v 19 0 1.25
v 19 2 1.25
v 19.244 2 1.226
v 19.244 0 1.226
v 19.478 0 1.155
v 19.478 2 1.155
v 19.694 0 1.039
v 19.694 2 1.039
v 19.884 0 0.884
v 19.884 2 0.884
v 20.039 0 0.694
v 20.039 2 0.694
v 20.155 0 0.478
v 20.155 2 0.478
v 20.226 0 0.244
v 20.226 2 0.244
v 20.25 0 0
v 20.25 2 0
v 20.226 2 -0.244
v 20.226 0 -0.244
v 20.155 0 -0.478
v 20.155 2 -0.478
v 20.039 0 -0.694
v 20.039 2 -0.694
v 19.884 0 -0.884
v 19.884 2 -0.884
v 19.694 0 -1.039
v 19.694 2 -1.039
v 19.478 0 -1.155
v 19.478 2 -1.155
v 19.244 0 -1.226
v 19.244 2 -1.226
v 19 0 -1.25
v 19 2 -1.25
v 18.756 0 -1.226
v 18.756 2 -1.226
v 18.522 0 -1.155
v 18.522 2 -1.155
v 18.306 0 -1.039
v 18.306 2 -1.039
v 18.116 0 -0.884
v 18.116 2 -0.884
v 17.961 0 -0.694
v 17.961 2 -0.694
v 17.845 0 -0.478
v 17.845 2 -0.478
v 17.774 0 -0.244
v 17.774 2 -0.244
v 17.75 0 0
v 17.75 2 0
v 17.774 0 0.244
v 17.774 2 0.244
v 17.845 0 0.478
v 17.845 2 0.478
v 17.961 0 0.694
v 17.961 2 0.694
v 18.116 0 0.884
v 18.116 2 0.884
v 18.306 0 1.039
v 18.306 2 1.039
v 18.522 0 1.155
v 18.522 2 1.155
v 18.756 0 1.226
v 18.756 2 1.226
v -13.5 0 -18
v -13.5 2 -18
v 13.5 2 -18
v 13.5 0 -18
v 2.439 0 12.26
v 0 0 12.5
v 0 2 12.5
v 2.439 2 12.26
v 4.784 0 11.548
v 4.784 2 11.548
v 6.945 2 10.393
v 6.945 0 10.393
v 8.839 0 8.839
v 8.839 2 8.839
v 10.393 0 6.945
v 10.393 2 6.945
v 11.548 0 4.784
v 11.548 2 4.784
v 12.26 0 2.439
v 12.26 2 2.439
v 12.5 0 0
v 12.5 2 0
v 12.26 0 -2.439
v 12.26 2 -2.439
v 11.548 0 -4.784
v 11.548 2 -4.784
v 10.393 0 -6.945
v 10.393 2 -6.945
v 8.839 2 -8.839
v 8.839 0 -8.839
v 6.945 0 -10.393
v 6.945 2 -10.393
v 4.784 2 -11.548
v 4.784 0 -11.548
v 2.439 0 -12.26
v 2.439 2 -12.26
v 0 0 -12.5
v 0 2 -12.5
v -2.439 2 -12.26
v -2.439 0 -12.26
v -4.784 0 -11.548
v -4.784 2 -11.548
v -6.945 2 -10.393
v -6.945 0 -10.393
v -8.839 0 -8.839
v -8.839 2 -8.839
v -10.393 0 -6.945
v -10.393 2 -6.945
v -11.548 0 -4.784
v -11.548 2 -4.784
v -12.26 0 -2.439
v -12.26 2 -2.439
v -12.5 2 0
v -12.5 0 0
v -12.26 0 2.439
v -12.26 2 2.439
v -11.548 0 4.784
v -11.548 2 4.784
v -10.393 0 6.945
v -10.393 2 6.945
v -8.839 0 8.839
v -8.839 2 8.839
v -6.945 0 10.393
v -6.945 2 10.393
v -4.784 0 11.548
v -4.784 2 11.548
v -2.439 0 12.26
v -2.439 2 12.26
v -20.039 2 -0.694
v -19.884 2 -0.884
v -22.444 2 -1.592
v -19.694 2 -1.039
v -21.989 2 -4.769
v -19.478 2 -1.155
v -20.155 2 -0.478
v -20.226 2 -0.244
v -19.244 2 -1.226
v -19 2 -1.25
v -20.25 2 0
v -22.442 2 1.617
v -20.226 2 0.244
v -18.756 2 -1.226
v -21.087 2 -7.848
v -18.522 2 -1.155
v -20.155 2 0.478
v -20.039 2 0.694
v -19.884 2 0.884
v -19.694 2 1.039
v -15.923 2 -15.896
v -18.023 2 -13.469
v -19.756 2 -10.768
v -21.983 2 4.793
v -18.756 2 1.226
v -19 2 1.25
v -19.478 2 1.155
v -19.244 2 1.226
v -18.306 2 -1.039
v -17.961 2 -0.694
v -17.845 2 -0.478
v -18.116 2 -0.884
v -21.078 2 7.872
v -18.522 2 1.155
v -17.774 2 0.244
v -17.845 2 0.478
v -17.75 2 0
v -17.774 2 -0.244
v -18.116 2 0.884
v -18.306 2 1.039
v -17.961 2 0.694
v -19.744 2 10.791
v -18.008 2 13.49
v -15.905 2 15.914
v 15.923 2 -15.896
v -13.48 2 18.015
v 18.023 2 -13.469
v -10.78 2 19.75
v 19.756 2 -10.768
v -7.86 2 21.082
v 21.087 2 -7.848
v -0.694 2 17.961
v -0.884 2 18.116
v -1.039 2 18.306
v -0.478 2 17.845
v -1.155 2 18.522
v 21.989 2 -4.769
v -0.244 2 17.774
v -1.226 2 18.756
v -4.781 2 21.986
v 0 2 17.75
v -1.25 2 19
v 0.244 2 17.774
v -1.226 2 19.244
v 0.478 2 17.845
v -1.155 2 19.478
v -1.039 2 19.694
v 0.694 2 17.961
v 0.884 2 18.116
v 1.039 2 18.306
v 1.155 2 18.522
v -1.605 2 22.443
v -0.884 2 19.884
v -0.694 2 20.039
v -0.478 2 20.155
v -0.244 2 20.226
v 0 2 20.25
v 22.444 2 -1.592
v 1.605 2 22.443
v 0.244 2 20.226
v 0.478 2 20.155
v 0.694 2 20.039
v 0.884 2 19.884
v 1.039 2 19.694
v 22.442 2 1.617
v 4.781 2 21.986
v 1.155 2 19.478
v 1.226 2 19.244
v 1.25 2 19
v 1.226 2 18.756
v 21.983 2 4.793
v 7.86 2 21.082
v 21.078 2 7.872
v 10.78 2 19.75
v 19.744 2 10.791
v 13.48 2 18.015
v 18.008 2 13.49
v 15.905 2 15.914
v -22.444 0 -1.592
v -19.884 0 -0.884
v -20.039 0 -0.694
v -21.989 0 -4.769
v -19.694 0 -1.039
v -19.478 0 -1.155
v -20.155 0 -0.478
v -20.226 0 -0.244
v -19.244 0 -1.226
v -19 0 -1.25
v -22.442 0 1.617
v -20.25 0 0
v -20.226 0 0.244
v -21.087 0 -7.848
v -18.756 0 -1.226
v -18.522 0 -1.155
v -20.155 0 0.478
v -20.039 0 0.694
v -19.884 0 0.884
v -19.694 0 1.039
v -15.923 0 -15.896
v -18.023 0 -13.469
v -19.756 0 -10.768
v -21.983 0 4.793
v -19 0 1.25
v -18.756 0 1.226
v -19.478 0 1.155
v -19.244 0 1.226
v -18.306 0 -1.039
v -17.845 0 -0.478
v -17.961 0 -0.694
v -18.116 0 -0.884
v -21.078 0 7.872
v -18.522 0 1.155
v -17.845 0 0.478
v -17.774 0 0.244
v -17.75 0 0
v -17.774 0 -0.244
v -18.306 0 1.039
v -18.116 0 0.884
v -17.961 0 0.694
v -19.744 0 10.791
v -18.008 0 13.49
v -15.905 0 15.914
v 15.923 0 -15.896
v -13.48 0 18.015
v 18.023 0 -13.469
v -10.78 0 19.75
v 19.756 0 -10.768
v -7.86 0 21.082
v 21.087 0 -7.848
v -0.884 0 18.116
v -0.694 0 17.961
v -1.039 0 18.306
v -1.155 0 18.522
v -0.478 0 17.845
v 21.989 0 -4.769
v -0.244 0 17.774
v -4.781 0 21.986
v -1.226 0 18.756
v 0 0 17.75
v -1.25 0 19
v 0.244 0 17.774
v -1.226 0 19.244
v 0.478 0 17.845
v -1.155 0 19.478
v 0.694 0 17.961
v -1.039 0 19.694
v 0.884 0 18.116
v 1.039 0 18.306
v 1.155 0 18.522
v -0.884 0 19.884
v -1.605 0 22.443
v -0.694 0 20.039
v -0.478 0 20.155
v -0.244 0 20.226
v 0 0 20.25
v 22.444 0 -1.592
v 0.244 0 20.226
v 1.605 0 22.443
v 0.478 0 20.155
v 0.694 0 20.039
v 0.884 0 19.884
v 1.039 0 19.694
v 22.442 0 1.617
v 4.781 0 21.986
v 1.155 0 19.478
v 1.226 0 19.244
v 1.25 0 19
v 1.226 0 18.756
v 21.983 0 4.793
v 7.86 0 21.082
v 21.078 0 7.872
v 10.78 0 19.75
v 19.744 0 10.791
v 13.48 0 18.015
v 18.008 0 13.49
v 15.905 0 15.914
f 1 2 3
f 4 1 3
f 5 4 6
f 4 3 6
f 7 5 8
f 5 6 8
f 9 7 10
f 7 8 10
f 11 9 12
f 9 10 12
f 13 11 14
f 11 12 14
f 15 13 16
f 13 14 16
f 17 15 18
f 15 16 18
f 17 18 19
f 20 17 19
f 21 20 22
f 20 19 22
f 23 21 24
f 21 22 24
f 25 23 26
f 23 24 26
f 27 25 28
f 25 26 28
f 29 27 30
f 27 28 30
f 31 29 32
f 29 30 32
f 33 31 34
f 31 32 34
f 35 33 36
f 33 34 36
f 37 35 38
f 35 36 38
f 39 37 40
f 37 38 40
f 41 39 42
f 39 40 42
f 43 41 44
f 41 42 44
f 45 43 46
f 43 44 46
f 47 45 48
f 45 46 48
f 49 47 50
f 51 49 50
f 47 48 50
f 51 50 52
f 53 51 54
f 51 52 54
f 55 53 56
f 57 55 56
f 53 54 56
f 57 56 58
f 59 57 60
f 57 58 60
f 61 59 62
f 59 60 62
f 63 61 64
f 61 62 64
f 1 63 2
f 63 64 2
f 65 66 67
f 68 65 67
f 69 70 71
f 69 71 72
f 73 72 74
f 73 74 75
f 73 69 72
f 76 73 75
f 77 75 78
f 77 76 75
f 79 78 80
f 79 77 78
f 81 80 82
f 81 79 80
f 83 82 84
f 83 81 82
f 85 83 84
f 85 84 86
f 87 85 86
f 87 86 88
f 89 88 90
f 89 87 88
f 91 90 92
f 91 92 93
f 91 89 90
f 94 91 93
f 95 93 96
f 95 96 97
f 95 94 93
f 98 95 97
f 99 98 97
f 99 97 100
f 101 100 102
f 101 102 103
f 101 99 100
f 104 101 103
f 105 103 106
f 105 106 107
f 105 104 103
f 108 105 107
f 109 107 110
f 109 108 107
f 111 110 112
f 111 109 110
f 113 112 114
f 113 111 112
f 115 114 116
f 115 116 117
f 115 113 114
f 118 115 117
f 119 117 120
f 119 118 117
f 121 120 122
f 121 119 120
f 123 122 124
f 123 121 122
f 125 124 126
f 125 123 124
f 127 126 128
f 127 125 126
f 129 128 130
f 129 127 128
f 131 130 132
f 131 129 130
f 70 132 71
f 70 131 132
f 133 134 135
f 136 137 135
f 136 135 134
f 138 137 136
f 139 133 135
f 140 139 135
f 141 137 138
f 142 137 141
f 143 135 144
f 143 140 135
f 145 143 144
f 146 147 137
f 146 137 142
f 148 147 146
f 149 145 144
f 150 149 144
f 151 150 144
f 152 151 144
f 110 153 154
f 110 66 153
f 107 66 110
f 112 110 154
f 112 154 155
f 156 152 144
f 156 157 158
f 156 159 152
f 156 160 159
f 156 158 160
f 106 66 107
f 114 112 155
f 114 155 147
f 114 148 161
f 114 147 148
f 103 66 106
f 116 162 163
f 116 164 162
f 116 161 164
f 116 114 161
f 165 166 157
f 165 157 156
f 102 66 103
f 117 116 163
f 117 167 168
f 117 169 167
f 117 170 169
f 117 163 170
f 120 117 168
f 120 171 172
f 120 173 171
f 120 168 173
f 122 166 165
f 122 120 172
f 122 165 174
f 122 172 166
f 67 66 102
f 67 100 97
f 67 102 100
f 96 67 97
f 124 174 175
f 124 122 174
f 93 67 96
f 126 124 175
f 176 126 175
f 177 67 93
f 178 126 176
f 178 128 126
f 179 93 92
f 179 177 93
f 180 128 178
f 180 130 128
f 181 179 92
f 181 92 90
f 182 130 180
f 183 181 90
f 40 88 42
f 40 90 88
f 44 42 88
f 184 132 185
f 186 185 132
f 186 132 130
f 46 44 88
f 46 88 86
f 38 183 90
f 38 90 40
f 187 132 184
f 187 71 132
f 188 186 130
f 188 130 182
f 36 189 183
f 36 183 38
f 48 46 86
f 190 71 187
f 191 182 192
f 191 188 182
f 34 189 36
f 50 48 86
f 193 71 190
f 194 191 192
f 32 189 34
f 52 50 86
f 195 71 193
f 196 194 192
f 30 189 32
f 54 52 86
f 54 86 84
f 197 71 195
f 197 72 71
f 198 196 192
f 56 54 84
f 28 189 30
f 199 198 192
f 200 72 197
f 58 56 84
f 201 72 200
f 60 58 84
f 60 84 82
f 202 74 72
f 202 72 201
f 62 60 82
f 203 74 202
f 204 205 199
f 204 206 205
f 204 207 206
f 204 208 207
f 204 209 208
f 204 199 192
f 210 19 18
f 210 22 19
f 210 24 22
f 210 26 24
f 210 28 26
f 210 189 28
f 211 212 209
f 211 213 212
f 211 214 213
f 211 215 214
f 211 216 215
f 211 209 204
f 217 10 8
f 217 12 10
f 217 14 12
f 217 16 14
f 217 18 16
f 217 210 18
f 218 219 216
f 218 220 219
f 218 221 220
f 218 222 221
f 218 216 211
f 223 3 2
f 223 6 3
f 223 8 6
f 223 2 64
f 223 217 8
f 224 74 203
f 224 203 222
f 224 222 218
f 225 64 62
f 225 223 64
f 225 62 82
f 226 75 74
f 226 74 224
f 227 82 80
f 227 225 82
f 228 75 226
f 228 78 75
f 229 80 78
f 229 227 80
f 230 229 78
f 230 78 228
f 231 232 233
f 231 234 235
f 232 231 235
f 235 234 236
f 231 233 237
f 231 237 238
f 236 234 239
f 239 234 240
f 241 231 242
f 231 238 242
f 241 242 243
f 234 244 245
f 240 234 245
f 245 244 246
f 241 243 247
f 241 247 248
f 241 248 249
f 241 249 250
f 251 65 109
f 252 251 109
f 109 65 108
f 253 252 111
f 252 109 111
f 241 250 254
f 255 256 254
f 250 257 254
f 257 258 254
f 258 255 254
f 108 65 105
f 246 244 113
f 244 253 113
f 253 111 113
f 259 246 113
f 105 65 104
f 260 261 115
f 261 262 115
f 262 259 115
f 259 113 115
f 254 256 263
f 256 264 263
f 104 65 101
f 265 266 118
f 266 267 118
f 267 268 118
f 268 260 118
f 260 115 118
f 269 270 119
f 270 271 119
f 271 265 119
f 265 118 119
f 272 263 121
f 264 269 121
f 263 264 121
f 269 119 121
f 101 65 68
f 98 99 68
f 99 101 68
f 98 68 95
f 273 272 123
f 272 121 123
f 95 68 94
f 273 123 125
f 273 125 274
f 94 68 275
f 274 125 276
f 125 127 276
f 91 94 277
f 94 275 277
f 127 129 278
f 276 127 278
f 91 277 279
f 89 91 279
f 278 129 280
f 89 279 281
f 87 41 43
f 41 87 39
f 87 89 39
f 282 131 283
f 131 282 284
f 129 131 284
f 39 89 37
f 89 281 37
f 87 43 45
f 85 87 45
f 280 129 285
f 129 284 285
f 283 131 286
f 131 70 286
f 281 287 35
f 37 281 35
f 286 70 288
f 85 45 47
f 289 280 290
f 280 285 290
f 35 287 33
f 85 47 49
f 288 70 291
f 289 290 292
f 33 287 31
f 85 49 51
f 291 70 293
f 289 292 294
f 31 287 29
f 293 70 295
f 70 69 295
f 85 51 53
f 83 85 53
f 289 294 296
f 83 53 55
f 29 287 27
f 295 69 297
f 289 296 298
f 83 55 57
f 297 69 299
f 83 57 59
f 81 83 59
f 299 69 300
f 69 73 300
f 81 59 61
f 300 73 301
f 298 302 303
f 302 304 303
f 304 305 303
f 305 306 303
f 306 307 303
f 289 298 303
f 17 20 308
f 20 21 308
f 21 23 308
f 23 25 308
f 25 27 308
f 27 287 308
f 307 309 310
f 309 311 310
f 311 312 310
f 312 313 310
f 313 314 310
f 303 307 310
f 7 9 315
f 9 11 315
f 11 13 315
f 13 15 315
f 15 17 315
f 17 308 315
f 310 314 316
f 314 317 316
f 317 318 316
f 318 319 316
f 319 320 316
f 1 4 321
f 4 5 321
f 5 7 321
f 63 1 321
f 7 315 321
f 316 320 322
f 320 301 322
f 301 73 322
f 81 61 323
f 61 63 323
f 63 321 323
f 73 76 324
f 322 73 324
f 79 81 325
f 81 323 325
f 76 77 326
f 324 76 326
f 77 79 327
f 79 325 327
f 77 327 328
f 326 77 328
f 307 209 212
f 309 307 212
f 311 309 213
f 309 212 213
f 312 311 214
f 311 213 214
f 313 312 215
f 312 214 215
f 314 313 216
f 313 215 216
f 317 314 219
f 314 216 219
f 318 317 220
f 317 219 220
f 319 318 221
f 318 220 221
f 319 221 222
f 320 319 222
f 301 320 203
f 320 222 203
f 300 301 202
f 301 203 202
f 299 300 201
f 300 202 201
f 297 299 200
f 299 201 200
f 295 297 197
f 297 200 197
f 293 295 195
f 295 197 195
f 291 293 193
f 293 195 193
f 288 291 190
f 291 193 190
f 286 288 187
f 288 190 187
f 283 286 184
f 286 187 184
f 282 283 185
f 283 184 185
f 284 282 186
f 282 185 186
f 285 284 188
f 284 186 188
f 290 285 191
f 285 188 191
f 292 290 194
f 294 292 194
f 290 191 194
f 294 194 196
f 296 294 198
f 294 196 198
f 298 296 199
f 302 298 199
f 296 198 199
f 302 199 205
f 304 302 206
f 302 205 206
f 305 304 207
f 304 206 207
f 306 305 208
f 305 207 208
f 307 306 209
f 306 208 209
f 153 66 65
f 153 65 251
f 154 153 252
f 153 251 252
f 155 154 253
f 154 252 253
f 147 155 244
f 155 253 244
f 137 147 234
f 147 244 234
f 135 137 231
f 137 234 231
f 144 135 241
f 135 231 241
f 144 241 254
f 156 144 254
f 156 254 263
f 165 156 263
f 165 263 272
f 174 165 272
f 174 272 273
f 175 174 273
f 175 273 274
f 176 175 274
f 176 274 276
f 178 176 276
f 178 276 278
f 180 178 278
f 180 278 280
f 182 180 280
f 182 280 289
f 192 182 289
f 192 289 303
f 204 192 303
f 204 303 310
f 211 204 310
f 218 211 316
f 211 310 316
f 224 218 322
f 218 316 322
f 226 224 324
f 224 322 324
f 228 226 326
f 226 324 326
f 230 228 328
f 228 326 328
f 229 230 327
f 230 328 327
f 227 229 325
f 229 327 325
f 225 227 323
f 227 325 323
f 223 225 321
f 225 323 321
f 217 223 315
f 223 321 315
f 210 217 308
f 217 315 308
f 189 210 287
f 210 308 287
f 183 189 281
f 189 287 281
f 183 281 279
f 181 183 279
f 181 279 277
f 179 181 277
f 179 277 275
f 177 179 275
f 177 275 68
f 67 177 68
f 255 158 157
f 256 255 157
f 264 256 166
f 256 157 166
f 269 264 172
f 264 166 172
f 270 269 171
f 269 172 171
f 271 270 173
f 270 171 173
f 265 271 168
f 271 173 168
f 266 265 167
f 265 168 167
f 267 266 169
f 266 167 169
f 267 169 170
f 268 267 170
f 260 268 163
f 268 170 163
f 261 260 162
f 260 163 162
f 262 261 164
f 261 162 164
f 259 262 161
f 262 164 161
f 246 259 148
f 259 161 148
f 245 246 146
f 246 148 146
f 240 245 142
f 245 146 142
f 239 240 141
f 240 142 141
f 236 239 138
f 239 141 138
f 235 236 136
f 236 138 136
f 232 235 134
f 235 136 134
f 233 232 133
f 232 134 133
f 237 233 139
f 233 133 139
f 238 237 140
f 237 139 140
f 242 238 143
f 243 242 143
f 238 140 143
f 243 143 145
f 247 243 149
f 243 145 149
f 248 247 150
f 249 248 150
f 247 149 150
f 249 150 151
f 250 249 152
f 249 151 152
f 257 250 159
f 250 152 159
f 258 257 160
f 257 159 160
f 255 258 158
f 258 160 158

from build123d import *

# Parameters (mm, degrees)
SKETCH_1_R          = 22.5
SKETCH_1_R_2        = 12.5
EXTRUDE_1_DEPTH     = 2
SKETCH_2_R          = 1.25
CUT_EXTRUDE_1_DEPTH = 2


with BuildPart() as part:
    # Эскиз1 → Бобышка-Вытянуть1 (new body)
    with BuildSketch(Plane(origin=(0, 0, 0), x_dir=(1, 0, 0), z_dir=(0, 1, 0))):
        with Locations(Location((0, 0, 0), (0, 0, 270))):
            Circle(SKETCH_1_R)
        with Locations(Location((0, 0, 0), (0, 0, 270))):
            Circle(SKETCH_1_R_2, mode=Mode.SUBTRACT)
    extrude(amount=EXTRUDE_1_DEPTH)

    # Эскиз2 → Вырез-Вытянуть1 (cut)
    with BuildSketch(Plane(origin=(0, 2, 0), x_dir=(1, 0, 0), z_dir=(0, 1, 0))):
        with Locations(Location((-19, 0, 0), (0, 0, 270))):
            Circle(SKETCH_2_R)
        with Locations(Location((19, 0, 0), (0, 0, 270))):
            Circle(SKETCH_2_R)
        with Locations(Location((0, -19, 0), (0, 0, 270))):
            Circle(SKETCH_2_R)
        Polygon((-20.23493598, 18), (18.121302114, 18), (0, 26.542268098), align=None)
    extrude(amount=-CUT_EXTRUDE_1_DEPTH, mode=Mode.SUBTRACT)


solid = part.part
